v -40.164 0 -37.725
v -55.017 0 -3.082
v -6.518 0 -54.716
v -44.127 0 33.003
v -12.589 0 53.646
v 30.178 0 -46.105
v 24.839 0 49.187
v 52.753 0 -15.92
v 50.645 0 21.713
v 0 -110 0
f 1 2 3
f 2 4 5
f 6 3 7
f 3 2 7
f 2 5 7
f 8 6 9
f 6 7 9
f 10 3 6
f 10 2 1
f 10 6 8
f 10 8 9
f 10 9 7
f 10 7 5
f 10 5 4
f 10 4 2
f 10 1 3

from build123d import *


with BuildPart() as f3:
    # F0 (on Front) → F3 section 0
    with BuildSketch(Plane.XZ, mode=Mode.PRIVATE) as f3_s0:
        Polygon((-55.016788, -3.08246), (-40.163938, -37.725411), (-6.517934, -54.716223), (30.177883, -46.104706), (52.753134, -15.920285), (50.644607, 21.713415), (24.838906, 49.187166), (-12.589196, 53.645696), (-44.126672, 33.002809), align=None)
    loft([f3_s0.sketch, Vertex(0, -110, 0)])


solid = f3.part
